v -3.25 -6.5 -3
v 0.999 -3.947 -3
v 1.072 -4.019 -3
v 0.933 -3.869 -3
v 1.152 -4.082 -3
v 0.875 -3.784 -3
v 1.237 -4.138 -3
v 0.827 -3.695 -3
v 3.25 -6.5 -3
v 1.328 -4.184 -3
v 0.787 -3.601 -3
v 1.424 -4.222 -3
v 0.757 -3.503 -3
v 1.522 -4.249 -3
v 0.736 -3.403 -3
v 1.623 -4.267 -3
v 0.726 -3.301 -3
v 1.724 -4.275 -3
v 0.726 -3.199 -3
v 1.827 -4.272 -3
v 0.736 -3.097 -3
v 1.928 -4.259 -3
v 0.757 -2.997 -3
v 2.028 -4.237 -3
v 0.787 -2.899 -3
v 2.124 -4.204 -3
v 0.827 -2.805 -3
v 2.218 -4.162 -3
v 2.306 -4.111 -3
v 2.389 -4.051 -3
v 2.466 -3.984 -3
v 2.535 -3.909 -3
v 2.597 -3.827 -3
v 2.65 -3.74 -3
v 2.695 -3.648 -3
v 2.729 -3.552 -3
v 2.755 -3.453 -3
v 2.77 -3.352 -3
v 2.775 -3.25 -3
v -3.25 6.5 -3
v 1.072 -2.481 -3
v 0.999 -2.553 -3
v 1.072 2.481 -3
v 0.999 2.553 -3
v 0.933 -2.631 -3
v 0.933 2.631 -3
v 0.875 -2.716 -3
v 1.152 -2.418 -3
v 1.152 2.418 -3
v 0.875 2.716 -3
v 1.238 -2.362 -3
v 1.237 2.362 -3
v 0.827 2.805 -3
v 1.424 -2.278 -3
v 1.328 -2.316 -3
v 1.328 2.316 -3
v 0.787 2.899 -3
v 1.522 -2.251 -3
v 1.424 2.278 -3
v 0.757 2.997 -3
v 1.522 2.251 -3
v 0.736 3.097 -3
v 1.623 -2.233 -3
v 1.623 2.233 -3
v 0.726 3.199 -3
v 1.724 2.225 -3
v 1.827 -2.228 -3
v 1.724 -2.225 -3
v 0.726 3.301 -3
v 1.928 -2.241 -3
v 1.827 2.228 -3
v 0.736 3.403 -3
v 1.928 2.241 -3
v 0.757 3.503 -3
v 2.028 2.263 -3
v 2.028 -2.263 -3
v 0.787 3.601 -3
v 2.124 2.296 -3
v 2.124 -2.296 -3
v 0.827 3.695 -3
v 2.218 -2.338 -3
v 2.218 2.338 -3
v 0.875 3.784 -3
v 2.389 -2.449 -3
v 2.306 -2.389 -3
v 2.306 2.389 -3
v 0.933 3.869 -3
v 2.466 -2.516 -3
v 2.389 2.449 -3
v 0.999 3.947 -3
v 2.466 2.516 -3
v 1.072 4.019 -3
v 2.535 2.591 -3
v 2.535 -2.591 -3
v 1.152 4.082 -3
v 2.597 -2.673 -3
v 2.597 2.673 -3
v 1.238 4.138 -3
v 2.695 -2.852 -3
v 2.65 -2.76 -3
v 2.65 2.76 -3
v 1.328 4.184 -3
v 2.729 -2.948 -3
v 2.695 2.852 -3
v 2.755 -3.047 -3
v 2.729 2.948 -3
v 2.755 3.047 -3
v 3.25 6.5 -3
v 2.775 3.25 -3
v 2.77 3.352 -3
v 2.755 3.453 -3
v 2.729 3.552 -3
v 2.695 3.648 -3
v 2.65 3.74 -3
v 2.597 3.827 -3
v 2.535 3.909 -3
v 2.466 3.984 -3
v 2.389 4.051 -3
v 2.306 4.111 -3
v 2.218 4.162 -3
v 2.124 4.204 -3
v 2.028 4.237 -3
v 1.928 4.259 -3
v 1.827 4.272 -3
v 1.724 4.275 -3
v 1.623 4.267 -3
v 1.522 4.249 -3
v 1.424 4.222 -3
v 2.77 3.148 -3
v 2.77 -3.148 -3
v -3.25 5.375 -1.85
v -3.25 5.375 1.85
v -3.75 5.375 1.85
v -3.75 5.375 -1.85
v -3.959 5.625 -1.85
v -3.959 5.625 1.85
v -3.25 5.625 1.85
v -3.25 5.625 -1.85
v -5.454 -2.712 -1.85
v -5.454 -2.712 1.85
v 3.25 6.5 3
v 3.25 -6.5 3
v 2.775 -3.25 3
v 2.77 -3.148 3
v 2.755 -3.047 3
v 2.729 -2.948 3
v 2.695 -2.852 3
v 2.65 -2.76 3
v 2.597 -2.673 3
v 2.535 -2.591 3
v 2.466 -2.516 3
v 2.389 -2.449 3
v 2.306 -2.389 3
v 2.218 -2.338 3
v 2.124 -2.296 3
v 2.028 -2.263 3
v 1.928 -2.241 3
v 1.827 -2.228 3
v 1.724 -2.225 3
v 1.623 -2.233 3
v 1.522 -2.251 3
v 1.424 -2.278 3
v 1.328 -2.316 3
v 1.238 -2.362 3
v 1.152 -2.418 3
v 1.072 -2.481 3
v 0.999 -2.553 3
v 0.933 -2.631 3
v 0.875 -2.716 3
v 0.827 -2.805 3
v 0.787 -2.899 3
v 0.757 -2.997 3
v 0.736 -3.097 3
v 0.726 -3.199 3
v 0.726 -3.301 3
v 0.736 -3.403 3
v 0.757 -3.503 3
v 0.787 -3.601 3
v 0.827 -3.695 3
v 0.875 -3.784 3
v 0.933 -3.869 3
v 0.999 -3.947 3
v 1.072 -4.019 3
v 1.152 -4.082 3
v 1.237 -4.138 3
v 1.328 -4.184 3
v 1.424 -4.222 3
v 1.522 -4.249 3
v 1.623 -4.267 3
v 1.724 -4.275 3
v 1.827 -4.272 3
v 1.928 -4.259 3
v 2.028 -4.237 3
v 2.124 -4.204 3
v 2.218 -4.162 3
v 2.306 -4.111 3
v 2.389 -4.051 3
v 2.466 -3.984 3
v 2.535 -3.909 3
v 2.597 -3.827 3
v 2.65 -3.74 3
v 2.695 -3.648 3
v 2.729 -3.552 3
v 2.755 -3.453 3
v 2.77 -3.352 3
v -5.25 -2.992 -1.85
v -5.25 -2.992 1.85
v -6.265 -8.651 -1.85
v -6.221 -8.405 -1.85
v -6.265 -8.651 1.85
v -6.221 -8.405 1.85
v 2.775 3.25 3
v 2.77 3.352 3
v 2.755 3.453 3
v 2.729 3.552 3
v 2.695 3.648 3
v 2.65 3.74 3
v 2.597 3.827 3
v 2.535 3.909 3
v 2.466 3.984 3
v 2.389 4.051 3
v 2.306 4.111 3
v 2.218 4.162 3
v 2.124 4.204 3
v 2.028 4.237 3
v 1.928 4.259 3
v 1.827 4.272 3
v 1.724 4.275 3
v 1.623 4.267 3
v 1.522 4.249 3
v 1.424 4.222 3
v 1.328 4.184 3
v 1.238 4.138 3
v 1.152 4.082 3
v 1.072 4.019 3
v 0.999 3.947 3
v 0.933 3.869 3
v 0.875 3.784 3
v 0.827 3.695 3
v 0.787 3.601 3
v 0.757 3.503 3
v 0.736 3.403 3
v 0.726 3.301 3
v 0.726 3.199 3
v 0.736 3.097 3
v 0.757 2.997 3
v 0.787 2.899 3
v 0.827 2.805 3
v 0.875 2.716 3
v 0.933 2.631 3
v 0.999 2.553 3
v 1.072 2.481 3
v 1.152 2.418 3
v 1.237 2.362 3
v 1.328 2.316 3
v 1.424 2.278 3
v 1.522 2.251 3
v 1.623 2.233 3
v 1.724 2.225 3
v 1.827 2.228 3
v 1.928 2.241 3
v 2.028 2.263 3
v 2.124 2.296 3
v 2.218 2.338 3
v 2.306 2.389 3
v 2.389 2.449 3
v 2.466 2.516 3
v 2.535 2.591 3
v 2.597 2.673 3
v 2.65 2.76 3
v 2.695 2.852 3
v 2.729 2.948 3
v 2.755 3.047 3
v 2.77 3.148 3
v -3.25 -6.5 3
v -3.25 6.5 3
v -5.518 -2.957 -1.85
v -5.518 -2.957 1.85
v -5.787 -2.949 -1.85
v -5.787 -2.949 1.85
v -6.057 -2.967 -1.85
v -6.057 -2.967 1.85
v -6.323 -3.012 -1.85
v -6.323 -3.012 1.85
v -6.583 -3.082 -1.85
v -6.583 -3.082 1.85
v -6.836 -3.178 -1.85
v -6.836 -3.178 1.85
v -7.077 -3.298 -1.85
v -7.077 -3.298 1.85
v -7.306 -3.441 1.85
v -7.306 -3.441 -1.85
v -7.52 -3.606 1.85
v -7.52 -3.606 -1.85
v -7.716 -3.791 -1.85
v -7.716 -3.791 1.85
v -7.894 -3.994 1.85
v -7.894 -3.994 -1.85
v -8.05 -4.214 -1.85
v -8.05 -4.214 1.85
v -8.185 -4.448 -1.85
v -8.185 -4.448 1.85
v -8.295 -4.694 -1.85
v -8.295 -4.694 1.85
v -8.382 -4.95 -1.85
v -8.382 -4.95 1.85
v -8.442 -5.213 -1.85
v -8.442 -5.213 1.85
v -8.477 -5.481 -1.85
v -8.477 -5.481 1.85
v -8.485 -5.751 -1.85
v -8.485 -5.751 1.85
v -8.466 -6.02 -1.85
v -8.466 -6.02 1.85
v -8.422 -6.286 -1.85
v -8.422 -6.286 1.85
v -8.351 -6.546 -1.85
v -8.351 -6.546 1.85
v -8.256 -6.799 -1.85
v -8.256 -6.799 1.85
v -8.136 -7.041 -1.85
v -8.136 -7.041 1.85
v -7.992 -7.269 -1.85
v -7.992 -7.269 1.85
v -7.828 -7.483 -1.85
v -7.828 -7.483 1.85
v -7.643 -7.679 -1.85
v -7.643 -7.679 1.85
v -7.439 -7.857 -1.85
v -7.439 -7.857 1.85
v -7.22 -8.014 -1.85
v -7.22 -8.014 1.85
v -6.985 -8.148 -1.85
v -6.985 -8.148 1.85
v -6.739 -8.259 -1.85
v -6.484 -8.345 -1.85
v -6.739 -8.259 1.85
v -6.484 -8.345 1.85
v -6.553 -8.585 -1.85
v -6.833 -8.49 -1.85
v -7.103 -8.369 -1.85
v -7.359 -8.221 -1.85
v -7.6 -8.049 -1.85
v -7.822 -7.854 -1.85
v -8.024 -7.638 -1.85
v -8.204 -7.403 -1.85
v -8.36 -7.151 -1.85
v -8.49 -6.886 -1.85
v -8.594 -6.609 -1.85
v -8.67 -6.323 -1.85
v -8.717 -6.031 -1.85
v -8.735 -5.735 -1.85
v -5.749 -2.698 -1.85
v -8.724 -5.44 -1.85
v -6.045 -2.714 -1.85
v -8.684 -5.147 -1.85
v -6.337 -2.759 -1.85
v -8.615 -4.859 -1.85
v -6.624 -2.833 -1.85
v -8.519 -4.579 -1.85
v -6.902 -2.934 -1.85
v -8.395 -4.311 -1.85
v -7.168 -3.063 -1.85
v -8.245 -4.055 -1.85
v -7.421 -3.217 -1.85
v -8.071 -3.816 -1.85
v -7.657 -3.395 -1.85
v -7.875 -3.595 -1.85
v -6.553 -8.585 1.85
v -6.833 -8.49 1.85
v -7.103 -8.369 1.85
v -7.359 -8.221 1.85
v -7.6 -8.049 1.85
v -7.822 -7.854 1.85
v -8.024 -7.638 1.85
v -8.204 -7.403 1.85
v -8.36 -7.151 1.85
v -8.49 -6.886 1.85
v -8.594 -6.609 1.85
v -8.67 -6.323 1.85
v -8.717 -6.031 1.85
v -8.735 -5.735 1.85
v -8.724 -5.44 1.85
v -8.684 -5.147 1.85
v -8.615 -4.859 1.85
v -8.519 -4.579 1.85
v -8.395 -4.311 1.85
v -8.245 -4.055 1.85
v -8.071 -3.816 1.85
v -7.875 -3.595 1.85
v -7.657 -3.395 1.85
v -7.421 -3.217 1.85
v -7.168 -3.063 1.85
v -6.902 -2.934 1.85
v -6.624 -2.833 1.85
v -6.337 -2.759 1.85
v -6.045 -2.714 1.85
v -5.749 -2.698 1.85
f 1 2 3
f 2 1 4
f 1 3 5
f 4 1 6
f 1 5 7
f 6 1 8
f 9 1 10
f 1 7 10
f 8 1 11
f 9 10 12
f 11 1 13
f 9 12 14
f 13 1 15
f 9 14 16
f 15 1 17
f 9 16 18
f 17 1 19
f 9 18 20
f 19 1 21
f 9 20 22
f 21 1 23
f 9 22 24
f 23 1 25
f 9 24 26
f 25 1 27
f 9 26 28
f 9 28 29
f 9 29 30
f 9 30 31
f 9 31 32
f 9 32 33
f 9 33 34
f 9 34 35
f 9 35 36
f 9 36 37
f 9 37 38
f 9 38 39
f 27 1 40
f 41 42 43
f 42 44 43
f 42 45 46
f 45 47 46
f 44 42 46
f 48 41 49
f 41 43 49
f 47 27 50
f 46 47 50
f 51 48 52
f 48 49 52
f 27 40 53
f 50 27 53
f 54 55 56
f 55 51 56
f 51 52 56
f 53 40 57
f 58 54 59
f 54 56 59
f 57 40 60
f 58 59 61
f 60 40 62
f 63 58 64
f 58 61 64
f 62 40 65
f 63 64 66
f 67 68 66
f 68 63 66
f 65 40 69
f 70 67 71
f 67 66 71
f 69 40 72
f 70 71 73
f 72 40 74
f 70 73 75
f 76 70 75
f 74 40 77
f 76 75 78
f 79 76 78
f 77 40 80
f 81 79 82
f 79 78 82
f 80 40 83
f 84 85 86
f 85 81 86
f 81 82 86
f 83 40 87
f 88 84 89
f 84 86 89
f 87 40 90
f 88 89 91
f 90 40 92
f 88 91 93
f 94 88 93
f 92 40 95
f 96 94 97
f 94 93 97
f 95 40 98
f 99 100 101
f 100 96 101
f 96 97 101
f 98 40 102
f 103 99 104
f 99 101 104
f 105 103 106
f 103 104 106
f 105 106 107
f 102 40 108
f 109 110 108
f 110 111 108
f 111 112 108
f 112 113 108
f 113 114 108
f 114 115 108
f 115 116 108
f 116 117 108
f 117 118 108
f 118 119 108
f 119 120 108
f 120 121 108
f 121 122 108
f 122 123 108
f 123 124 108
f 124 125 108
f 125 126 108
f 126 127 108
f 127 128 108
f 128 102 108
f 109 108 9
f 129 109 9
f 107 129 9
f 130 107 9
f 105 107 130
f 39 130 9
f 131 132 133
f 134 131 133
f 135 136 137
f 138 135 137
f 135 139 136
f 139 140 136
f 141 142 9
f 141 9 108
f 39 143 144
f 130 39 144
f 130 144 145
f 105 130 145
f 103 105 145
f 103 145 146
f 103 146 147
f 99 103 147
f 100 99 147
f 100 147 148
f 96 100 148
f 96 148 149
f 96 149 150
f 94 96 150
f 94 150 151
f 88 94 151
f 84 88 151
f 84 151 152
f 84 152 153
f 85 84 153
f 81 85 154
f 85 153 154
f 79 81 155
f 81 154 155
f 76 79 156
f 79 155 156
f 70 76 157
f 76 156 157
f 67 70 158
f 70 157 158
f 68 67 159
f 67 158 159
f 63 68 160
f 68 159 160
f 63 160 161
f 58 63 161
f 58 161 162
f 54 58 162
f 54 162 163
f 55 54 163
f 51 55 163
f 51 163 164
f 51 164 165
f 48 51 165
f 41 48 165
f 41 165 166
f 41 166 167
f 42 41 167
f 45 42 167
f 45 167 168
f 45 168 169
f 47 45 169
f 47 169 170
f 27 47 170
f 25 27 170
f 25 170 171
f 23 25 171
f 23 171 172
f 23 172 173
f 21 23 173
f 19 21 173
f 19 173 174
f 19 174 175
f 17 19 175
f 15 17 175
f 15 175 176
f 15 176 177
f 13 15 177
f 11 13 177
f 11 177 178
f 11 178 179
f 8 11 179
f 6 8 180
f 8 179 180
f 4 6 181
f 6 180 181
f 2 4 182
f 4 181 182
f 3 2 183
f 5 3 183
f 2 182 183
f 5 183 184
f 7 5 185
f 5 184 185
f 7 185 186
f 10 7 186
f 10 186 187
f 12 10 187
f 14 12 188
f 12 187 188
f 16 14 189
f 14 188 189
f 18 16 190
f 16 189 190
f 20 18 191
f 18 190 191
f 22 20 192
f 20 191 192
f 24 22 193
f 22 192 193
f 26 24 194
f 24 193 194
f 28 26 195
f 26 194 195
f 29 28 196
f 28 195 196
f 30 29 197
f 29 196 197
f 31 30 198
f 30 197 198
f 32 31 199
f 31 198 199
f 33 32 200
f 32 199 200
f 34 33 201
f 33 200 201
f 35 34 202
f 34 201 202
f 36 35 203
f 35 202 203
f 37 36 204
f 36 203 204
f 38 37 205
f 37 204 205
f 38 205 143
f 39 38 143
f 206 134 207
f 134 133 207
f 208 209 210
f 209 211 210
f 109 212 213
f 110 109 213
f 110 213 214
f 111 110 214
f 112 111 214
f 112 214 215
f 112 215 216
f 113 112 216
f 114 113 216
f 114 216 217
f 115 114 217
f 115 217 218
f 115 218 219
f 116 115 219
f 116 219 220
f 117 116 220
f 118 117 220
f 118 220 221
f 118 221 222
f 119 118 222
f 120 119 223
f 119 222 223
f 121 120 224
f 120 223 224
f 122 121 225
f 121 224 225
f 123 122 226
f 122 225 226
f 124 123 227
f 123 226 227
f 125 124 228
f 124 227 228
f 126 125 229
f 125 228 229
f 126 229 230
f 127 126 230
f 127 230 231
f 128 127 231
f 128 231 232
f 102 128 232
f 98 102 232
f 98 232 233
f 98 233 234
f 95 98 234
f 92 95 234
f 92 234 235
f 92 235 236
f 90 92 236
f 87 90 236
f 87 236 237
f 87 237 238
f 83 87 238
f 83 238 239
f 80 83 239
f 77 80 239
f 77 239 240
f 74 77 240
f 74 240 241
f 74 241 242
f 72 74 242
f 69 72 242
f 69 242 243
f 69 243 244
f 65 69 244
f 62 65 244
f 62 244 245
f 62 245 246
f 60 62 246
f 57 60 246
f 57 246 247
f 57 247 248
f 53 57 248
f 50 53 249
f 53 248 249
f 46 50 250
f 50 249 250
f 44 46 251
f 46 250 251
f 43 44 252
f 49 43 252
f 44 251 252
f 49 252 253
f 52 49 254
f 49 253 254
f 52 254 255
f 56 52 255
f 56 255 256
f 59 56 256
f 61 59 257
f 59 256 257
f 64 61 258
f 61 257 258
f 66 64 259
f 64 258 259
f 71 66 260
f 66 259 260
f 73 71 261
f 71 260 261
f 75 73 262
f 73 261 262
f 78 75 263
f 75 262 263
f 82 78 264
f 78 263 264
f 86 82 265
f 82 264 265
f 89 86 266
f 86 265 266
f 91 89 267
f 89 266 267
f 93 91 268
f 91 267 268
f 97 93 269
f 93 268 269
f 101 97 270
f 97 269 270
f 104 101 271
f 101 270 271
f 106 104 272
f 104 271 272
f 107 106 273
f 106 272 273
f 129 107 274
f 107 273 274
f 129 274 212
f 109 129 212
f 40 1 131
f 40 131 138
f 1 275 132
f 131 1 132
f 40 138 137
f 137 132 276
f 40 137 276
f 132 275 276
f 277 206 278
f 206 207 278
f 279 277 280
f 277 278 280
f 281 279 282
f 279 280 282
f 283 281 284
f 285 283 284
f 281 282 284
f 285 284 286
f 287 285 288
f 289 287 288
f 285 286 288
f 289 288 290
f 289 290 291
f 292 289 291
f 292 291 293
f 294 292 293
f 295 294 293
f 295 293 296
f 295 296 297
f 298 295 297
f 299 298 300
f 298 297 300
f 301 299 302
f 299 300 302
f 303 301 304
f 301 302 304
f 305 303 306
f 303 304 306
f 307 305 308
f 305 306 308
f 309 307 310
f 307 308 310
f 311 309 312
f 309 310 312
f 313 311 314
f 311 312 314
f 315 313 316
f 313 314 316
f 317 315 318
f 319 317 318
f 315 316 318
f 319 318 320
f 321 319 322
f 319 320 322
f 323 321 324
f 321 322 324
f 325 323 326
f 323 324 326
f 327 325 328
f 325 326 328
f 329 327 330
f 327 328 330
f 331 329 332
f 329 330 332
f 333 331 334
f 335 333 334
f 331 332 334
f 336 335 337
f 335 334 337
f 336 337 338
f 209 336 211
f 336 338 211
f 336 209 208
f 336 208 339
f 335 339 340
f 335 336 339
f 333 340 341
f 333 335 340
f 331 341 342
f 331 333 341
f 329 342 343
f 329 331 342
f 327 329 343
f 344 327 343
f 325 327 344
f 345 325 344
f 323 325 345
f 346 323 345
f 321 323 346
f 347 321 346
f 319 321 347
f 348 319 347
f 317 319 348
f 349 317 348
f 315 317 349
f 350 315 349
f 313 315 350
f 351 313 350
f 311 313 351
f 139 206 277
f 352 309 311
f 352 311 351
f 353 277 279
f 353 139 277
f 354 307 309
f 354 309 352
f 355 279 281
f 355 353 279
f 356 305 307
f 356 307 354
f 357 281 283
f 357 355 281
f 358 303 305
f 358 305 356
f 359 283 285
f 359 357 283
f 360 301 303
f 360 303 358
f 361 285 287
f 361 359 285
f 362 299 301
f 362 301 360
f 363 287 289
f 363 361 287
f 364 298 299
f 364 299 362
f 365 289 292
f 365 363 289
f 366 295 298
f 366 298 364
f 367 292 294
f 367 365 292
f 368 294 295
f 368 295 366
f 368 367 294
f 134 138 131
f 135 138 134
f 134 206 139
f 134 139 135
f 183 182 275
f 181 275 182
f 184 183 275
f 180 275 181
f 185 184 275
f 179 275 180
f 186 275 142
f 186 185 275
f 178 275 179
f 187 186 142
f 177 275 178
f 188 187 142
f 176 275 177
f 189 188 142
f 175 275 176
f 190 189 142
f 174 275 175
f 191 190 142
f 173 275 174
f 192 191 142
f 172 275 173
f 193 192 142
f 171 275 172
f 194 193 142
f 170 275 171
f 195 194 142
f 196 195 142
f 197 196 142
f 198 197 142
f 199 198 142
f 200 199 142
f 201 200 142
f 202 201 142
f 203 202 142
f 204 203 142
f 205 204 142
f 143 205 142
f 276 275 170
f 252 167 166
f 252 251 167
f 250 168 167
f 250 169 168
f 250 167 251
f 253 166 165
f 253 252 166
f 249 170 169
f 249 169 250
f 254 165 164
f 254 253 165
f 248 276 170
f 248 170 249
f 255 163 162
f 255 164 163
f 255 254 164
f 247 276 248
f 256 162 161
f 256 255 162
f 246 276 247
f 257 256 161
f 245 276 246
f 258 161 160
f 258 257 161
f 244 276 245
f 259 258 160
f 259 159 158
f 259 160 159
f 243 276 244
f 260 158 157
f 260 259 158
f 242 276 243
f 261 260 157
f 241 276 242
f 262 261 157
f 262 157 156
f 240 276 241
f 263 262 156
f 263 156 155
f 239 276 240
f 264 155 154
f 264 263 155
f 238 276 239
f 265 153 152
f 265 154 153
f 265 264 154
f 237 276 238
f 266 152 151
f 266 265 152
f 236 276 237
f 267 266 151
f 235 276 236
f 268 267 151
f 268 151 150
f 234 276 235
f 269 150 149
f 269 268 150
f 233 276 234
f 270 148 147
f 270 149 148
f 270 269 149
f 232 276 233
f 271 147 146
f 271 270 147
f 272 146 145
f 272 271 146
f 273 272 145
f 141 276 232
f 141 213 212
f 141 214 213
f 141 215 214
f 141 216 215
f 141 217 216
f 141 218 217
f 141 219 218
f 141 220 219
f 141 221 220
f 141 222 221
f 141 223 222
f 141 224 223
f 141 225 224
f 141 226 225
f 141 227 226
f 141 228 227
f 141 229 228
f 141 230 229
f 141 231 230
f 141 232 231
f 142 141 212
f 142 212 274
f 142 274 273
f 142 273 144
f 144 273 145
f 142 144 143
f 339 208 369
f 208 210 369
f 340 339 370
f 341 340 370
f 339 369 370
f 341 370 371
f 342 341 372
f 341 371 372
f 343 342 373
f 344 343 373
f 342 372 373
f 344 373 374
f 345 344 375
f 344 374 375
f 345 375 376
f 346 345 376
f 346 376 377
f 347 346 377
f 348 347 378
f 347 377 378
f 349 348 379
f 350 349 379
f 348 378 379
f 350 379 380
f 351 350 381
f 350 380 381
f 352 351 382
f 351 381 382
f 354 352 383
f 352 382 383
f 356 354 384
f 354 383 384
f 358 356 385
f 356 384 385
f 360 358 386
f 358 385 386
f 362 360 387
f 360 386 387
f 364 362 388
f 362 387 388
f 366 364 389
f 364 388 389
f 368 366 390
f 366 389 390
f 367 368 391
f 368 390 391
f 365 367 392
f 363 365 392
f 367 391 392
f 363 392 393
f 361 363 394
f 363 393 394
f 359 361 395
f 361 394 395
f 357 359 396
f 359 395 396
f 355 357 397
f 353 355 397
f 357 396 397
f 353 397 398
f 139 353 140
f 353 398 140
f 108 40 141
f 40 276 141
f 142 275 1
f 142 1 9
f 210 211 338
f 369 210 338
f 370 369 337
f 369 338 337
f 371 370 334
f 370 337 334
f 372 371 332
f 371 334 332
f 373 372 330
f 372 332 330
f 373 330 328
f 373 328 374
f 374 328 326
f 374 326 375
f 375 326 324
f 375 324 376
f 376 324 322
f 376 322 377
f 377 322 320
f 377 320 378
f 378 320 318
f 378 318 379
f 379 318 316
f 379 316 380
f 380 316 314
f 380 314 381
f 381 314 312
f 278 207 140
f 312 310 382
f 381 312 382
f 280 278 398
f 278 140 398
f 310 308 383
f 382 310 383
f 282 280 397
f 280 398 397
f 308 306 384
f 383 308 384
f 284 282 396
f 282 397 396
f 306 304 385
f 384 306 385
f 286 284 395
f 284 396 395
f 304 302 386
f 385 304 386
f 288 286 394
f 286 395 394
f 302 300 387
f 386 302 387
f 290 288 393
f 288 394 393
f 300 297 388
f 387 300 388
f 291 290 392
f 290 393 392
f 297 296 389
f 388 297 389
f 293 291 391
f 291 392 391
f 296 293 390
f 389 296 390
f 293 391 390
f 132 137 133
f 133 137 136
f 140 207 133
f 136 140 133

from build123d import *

# Parameters (mm, degrees)
SKETCH1_W           = 6.5
SKETCH1_H           = 13
BOSS_EXTRUDE1_DEPTH = 3
SKETCH4_R           = 1.025
CUT_EXTRUDE1_DEPTH  = 7
EXTRUDE_THIN1_DEPTH = 1.85


with BuildPart() as part:
    # Sketch1 → Boss-Extrude1 (new body, symmetric)
    with BuildSketch(Plane.XY):
        Rectangle(SKETCH1_W, SKETCH1_H)
    extrude(amount=BOSS_EXTRUDE1_DEPTH, both=True)

    # Sketch4 → Cut-Extrude1 (cut, through all)
    with BuildSketch(Plane.XY.offset(3)):
        with Locations((1.75, 3.25)):
            Circle(SKETCH4_R)
        with Locations((1.75, -3.25)):
            Circle(SKETCH4_R)
    extrude(amount=-CUT_EXTRUDE1_DEPTH, mode=Mode.SUBTRACT)

    # Sketch9 → Extrude-Thin1 (add, symmetric)
    with BuildSketch(Plane.XY):
        with BuildLine():
            Line((-3.25, 5.375), (-3.75, 5.375))
            Line((-3.75, 5.375), (-5.25, -2.991600265))
            ThreePointArc((-5.25, -2.991600265), (-8.44213538, -5.21314741), (-6.220588235, -8.40528279))
            Line((-6.220588235, -8.40528279), (-6.264705882, -8.651359268))
            ThreePointArc((-6.264705882, -8.651359268), (-8.707721009, -5.292635692), (-5.453800269, -2.711677189))
            Line((-5.453800269, -2.711677189), (-3.959165007, 5.625))
            Line((-3.959165007, 5.625), (-3.25, 5.625))
            Line((-3.25, 5.625), (-3.25, 5.375))
        make_face()
    extrude(amount=EXTRUDE_THIN1_DEPTH, both=True)


solid = part.part
